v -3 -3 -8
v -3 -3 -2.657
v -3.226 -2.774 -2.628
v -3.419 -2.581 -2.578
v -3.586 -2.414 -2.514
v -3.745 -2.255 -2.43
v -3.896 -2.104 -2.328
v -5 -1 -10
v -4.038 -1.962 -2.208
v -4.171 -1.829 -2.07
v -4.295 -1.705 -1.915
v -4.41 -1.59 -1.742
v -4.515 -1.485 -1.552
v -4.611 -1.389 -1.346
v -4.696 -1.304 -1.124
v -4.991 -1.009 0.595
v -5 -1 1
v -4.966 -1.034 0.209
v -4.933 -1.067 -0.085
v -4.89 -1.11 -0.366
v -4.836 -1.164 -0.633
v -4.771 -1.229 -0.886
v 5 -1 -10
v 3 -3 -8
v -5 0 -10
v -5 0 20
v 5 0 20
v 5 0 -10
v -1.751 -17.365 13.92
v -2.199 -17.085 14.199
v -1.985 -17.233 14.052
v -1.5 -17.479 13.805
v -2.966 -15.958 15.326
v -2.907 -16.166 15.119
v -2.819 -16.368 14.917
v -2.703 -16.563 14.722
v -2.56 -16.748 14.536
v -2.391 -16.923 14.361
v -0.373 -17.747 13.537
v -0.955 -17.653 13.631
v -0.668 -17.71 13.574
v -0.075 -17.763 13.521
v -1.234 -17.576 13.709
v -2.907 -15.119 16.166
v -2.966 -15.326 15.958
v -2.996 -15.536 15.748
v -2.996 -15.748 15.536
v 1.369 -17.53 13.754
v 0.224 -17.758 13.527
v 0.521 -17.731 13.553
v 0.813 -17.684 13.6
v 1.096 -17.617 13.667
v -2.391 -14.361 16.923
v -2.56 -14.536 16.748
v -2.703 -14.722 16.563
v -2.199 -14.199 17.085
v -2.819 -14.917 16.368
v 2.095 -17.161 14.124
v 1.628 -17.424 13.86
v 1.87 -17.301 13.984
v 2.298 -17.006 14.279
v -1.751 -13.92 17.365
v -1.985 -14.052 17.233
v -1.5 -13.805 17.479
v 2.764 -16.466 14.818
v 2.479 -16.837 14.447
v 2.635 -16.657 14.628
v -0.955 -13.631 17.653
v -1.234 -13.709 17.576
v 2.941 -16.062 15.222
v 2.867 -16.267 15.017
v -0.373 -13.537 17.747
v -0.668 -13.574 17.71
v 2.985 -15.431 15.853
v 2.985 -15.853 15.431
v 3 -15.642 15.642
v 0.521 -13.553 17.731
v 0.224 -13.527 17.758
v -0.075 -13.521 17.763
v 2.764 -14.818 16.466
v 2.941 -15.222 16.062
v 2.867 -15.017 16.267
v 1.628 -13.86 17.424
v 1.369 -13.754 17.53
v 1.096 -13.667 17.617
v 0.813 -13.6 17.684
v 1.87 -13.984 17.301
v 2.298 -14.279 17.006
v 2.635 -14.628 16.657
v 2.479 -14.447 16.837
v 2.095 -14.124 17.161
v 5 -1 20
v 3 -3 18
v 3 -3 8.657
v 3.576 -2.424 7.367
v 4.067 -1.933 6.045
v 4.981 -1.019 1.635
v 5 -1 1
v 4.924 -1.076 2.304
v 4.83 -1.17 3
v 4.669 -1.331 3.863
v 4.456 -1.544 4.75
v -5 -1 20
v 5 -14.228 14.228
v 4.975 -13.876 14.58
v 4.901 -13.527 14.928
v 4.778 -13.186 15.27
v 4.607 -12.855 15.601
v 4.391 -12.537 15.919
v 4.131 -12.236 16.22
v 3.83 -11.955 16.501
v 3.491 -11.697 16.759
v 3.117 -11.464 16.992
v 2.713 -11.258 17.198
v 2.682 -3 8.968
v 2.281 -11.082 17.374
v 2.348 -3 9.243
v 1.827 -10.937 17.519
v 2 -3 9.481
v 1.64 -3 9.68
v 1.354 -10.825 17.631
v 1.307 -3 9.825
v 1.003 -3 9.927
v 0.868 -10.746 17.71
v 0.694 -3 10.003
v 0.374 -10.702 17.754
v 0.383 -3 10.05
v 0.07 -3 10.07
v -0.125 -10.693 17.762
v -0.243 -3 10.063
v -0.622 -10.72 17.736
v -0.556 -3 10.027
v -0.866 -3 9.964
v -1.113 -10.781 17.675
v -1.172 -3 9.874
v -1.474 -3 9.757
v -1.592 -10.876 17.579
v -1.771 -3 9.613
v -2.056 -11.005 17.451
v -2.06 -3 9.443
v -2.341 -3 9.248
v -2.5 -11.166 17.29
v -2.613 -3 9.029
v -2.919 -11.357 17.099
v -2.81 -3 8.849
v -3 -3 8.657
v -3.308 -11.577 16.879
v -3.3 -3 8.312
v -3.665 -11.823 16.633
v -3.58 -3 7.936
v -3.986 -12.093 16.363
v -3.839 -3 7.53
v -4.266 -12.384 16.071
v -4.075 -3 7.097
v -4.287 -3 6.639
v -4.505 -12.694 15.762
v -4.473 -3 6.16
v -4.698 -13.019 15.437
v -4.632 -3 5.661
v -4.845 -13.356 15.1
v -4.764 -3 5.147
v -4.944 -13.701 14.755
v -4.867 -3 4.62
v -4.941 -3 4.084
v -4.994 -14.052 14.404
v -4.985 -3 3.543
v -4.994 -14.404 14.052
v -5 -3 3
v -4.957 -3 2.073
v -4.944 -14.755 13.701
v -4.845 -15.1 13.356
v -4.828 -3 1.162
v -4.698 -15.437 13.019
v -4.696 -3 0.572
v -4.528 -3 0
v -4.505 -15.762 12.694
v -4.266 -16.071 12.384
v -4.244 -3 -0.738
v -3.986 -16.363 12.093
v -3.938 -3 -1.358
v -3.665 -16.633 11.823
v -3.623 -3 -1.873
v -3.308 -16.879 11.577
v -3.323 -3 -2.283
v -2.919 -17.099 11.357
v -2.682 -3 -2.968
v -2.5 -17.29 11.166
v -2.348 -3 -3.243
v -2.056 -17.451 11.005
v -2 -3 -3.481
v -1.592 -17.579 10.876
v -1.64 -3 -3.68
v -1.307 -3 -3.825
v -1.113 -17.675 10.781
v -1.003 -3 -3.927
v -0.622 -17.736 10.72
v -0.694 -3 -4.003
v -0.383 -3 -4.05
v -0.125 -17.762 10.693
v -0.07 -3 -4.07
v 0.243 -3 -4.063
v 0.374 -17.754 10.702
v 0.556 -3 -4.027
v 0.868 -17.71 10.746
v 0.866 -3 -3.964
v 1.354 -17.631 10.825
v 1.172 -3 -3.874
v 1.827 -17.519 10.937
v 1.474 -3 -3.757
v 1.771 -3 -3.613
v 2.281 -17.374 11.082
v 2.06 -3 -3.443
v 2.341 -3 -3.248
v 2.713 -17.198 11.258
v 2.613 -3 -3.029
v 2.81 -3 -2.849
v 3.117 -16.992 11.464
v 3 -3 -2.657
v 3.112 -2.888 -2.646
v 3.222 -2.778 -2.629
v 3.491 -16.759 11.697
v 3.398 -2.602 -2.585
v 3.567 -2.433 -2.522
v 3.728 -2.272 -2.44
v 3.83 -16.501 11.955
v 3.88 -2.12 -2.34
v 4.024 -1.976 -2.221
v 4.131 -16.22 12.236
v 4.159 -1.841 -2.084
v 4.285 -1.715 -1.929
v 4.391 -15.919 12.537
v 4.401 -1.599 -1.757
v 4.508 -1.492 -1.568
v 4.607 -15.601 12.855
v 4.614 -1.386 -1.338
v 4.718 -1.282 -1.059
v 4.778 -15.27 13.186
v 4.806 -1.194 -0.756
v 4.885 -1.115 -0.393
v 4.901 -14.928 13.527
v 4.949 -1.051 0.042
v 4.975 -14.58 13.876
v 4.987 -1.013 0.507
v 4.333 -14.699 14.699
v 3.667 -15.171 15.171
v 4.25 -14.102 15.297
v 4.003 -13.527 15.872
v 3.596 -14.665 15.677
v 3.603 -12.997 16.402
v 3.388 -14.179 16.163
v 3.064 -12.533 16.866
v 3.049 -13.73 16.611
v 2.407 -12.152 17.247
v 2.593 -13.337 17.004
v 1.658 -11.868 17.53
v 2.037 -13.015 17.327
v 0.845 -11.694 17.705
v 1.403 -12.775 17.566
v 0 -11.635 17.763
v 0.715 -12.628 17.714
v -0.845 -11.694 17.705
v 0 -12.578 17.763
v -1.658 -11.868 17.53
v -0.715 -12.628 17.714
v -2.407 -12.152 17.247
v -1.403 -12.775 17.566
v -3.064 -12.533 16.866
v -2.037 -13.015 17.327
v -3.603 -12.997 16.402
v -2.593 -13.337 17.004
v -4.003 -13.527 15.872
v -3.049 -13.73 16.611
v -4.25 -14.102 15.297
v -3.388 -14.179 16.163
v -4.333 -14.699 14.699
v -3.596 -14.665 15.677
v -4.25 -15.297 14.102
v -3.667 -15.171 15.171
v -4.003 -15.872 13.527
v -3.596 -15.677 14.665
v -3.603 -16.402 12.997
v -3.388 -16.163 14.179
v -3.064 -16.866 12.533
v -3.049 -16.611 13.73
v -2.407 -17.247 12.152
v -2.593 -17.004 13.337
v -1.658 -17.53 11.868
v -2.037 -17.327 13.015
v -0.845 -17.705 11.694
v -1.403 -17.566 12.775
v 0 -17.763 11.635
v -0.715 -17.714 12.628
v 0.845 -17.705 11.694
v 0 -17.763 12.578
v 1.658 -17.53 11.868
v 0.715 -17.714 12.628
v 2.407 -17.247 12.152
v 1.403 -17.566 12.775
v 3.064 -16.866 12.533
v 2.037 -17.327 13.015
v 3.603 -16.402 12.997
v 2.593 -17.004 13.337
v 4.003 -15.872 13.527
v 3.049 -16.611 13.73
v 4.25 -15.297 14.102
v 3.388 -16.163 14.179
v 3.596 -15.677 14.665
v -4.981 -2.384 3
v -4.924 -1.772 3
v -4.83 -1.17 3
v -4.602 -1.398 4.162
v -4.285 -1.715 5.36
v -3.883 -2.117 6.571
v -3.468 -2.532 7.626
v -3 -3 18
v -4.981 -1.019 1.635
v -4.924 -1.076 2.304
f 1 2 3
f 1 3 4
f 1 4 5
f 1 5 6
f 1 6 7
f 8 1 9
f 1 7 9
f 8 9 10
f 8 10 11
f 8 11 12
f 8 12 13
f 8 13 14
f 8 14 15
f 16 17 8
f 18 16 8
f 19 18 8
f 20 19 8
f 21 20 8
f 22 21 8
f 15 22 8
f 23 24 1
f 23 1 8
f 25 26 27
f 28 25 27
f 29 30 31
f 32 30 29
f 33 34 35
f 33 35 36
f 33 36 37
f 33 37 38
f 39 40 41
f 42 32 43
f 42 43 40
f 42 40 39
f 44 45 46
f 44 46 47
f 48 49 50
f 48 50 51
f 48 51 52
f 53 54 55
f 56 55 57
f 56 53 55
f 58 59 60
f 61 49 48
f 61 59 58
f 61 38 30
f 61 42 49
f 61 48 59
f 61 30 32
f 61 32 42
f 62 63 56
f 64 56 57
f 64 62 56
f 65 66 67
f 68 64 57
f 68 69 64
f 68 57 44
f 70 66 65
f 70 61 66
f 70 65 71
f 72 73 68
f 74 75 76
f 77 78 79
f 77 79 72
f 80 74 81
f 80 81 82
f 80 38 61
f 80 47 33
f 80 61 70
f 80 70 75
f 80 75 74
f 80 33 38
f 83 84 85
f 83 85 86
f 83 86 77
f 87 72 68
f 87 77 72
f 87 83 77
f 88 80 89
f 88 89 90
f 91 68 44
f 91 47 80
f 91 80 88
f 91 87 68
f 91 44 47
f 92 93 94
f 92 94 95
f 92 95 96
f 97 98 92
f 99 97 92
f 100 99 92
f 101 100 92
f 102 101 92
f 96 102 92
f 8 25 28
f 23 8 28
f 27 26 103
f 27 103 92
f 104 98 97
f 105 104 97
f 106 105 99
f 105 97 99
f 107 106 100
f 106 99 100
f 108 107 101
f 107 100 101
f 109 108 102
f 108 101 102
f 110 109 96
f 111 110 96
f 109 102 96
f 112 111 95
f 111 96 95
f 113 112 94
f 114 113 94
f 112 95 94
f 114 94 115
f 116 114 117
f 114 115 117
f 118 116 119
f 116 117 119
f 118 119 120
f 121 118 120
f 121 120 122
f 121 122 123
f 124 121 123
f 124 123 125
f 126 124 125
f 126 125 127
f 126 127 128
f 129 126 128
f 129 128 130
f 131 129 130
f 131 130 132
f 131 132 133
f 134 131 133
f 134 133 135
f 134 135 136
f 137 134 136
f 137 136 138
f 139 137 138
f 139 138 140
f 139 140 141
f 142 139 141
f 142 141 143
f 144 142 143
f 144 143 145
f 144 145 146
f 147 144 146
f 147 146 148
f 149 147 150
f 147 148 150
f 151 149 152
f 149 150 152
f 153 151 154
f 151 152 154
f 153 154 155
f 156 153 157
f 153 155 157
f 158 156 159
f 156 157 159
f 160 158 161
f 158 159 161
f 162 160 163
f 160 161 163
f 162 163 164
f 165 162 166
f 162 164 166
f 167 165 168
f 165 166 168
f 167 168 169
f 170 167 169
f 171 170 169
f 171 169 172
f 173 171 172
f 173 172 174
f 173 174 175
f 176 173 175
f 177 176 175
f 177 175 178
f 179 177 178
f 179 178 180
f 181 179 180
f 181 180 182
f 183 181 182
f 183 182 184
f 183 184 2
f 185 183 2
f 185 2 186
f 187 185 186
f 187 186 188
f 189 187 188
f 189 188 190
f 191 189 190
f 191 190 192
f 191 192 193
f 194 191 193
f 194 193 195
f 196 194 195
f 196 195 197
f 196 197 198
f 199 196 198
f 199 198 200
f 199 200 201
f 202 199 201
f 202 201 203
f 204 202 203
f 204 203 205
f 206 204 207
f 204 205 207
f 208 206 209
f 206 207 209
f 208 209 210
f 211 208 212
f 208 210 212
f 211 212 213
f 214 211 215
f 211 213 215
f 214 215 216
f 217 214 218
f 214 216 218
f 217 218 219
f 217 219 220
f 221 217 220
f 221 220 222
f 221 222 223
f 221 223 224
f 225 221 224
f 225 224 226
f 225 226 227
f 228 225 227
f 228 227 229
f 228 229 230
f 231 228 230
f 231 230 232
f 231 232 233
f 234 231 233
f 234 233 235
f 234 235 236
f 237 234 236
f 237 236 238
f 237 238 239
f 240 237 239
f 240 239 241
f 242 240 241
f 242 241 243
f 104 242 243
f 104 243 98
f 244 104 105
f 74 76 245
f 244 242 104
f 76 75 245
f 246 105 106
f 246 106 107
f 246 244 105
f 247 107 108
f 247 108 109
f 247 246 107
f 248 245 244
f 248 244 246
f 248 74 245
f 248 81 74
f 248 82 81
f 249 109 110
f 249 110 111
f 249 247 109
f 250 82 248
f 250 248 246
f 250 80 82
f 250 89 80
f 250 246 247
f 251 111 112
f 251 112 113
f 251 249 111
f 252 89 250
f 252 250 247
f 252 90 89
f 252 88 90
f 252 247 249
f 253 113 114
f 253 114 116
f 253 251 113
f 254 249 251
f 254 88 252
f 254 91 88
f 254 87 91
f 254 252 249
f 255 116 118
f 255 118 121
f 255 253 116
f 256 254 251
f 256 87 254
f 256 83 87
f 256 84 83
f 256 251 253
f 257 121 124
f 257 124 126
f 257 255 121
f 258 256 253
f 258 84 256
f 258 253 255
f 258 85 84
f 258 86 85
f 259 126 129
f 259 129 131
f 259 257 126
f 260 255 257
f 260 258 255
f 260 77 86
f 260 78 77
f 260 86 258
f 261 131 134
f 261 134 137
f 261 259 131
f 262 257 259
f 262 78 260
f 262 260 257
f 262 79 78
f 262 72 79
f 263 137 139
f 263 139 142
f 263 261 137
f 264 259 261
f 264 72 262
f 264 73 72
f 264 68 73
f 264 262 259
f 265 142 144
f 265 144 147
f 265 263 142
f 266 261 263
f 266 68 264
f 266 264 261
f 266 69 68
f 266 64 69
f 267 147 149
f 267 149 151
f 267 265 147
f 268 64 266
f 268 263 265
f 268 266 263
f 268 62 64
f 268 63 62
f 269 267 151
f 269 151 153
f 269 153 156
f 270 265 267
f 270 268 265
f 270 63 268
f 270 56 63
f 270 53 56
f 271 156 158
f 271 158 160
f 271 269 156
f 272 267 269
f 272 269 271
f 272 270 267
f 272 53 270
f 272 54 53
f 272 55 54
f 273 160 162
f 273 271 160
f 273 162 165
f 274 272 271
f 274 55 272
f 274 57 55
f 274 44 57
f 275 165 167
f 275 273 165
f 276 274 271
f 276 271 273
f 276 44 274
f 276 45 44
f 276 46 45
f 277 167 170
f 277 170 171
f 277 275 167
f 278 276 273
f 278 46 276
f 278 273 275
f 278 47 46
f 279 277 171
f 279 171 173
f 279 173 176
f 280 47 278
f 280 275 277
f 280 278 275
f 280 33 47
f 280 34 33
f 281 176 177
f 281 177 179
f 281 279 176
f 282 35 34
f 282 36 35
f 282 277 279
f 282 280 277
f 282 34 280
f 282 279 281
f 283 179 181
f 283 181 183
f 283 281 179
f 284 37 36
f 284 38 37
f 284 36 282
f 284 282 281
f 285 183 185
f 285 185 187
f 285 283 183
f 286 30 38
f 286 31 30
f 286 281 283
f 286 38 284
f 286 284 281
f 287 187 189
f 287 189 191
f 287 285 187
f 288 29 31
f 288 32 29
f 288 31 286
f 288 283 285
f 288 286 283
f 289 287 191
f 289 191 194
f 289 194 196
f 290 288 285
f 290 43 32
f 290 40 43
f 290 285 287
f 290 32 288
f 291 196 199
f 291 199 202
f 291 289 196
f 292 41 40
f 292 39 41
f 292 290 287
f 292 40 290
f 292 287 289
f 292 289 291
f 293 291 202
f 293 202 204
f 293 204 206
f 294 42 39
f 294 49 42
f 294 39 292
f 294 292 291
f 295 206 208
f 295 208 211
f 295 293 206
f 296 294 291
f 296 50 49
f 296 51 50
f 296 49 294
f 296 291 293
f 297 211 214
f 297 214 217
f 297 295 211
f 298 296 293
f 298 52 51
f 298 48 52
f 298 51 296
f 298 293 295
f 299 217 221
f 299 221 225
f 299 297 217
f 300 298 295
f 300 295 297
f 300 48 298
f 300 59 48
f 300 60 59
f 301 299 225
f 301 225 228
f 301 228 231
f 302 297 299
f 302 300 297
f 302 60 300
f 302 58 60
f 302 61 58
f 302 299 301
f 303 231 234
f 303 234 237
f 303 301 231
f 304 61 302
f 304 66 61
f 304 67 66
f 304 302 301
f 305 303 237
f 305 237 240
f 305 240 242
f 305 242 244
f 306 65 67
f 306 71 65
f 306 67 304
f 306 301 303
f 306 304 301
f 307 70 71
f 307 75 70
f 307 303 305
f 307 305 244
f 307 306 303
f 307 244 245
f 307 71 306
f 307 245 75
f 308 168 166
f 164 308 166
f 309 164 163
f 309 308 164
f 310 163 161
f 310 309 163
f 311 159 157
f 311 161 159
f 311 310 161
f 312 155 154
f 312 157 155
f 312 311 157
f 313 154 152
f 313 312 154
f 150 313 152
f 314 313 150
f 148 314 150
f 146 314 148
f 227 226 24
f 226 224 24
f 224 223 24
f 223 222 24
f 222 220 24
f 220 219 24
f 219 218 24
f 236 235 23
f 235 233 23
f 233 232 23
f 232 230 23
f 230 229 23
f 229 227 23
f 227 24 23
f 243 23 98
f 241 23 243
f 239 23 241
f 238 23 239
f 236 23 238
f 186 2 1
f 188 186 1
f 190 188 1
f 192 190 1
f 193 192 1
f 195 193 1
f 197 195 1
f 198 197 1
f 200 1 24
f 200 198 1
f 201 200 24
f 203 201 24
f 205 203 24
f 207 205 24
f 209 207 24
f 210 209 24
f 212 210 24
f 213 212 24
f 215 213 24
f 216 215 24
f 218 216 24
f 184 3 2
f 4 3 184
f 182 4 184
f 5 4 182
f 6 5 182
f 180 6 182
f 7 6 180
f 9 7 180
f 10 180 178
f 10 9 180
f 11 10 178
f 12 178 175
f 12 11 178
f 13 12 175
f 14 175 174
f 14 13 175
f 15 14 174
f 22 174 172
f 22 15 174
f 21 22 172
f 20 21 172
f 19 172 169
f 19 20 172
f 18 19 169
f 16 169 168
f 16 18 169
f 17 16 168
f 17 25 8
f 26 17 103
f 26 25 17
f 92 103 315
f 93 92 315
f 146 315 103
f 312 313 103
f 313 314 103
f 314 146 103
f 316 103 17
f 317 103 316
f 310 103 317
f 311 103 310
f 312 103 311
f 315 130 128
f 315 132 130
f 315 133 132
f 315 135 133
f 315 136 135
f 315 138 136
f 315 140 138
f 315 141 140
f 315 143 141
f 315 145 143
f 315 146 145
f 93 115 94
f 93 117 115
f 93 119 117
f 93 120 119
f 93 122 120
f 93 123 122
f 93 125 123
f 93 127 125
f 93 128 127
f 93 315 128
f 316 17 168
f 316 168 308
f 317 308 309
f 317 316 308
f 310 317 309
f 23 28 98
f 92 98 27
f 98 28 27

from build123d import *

# Parameters (mm, degrees)
F0_W          = 10
F0_H          = 30
F1_DEPTH      = 3
F4_R          = 5
F5_DEPTH      = 20
F5_DEPTH_BACK = 5
F6_T1_DEPTH   = 20.2867319519
F6_T6_DEPTH   = 22.1433659759
F6_S7_R       = 5
F6_T8_DEPTH   = 13
F6_T14_DEPTH  = 22.1433659759
F6_S15_R      = 5
F6_T16_DEPTH  = 13
F6_T20_DEPTH  = 18.1433659759
F6_S21_R      = 5
F6_T22_DEPTH  = 11
F6_T26_DEPTH  = 18.1433659759
F6_S27_R      = 5
F6_T28_DEPTH  = 11
F7_DEPTH      = 25


# Not quite as in the source:
# - a fillet or chamfer that OpenCascade refuses, or shapes differently, is made with other operations: its cross-section is extruded or revolved along the edge and cut away or added


with BuildPart() as f1:
    # F0 (on Front) → F1 (new body)
    with BuildSketch(Plane.XZ):
        with Locations((0, 5)):
            Rectangle(F0_W, F0_H)
    extrude(amount=F1_DEPTH)

    # F4 (on face) → F5 (join, two sides)
    with BuildSketch(Plane(origin=(0, -1.5, 1.5), x_dir=(1, 0, 0), z_dir=(0, -0.7071067812, 0.7071067812))) as f5_sk:
        Circle(F4_R)
    extrude(amount=F5_DEPTH)
    extrude(f5_sk.sketch, amount=-F5_DEPTH_BACK)

    # F6: chamfer of 2 on 5 edges, made by hand

    # F6_s2 → F6_t1 (cut)
    with BuildSketch(Plane.YZ.offset(-10.1433659759)):
        Polygon((-1, 20), (-3, 18), (-3, 20), align=None)
        Polygon((-3, -8), (-1, -10), (-3, -10), align=None)
    extrude(amount=F6_T1_DEPTH, mode=Mode.SUBTRACT)


with BuildPart() as f6_tool4:
    # F6_s5 → F6_t6 (new body)
    with BuildSketch(Plane.XY.offset(25.1433659759)):
        Polygon((-3, -3), (-5, -1), (-5, -3), align=None)
    extrude(amount=-F6_T6_DEPTH)

    # F6_s7 → F6_t8 (cut, symmetric)
    with BuildSketch(Plane(origin=(0, -8.0610173055, 8.0610173055), x_dir=(1, 0, 0), z_dir=(0, 0.7071067812, -0.7071067812))):
        Circle(F6_S7_R)
    extrude(amount=F6_T8_DEPTH, both=True, mode=Mode.SUBTRACT)


with BuildPart() as f1_1:
    add(f1.part)

    # F6_t3: cut F6_tool4
    add(f6_tool4.part, mode=Mode.SUBTRACT)

    # F6_s9 → F6_t10 (revolve, cut)
    with BuildSketch(Plane(origin=(0, 0, 0), x_dir=(1, 0, 0), z_dir=(0, -0.7071067812, -0.7071067812))):
        Polygon((5, 20.1213203436), (3, 22.1213203436), (5, 22.1213203436), align=None)
    revolve(axis=Axis((0, -15.6421356237, 15.6421356237), (0, -0.7071067812, 0.7071067812)), mode=Mode.SUBTRACT)


with BuildPart() as f6_tool12:
    # F6_s13 → F6_t14 (new body)
    with BuildSketch(Plane.XY.offset(3)):
        Polygon((3, -3), (5, -1), (5, -3), align=None)
    extrude(amount=F6_T14_DEPTH)

    # F6_s15 → F6_t16 (cut, symmetric)
    with BuildSketch(Plane(origin=(0, -8.0610173055, 8.0610173055), x_dir=(1, 0, 0), z_dir=(0, 0.7071067812, -0.7071067812))):
        Circle(F6_S15_R)
    extrude(amount=F6_T16_DEPTH, both=True, mode=Mode.SUBTRACT)


with BuildPart() as f1_2:
    add(f1_1.part)

    # F6_t11: cut F6_tool12
    add(f6_tool12.part, mode=Mode.SUBTRACT)


with BuildPart() as f6_tool18:
    # F6_s19 → F6_t20 (new body)
    with BuildSketch(Plane.XY.offset(-15.1433659759)):
        Polygon((3, -3), (5, -1), (5, -3), align=None)
    extrude(amount=F6_T20_DEPTH)

    # F6_s21 → F6_t22 (cut, symmetric)
    with BuildSketch(Plane(origin=(0, 2.0506096654, -2.0506096654), x_dir=(1, 0, 0), z_dir=(0, 0.7071067812, -0.7071067812))):
        Circle(F6_S21_R)
    extrude(amount=F6_T22_DEPTH, both=True, mode=Mode.SUBTRACT)


with BuildPart() as f1_3:
    add(f1_2.part)

    # F6_t17: cut F6_tool18
    add(f6_tool18.part, mode=Mode.SUBTRACT)


with BuildPart() as f6_tool24:
    # F6_s25 → F6_t26 (new body)
    with BuildSketch(Plane.XY.offset(3)):
        Polygon((-3, -3), (-5, -1), (-5, -3), align=None)
    extrude(amount=-F6_T26_DEPTH)

    # F6_s27 → F6_t28 (cut, symmetric)
    with BuildSketch(Plane(origin=(0, 2.0506096654, -2.0506096654), x_dir=(1, 0, 0), z_dir=(0, 0.7071067812, -0.7071067812))):
        Circle(F6_S27_R)
    extrude(amount=F6_T28_DEPTH, both=True, mode=Mode.SUBTRACT)


with BuildPart() as f1_4:
    add(f1_3.part)

    # F6_t23: cut F6_tool24
    add(f6_tool24.part, mode=Mode.SUBTRACT)

    # F0 (on Front) → F7 (cut)
    with BuildSketch(Plane.XZ):
        with Locations((0, 5)):
            Rectangle(F0_W, F0_H)
    extrude(amount=-F7_DEPTH, mode=Mode.SUBTRACT)


solid = f1_4.part
